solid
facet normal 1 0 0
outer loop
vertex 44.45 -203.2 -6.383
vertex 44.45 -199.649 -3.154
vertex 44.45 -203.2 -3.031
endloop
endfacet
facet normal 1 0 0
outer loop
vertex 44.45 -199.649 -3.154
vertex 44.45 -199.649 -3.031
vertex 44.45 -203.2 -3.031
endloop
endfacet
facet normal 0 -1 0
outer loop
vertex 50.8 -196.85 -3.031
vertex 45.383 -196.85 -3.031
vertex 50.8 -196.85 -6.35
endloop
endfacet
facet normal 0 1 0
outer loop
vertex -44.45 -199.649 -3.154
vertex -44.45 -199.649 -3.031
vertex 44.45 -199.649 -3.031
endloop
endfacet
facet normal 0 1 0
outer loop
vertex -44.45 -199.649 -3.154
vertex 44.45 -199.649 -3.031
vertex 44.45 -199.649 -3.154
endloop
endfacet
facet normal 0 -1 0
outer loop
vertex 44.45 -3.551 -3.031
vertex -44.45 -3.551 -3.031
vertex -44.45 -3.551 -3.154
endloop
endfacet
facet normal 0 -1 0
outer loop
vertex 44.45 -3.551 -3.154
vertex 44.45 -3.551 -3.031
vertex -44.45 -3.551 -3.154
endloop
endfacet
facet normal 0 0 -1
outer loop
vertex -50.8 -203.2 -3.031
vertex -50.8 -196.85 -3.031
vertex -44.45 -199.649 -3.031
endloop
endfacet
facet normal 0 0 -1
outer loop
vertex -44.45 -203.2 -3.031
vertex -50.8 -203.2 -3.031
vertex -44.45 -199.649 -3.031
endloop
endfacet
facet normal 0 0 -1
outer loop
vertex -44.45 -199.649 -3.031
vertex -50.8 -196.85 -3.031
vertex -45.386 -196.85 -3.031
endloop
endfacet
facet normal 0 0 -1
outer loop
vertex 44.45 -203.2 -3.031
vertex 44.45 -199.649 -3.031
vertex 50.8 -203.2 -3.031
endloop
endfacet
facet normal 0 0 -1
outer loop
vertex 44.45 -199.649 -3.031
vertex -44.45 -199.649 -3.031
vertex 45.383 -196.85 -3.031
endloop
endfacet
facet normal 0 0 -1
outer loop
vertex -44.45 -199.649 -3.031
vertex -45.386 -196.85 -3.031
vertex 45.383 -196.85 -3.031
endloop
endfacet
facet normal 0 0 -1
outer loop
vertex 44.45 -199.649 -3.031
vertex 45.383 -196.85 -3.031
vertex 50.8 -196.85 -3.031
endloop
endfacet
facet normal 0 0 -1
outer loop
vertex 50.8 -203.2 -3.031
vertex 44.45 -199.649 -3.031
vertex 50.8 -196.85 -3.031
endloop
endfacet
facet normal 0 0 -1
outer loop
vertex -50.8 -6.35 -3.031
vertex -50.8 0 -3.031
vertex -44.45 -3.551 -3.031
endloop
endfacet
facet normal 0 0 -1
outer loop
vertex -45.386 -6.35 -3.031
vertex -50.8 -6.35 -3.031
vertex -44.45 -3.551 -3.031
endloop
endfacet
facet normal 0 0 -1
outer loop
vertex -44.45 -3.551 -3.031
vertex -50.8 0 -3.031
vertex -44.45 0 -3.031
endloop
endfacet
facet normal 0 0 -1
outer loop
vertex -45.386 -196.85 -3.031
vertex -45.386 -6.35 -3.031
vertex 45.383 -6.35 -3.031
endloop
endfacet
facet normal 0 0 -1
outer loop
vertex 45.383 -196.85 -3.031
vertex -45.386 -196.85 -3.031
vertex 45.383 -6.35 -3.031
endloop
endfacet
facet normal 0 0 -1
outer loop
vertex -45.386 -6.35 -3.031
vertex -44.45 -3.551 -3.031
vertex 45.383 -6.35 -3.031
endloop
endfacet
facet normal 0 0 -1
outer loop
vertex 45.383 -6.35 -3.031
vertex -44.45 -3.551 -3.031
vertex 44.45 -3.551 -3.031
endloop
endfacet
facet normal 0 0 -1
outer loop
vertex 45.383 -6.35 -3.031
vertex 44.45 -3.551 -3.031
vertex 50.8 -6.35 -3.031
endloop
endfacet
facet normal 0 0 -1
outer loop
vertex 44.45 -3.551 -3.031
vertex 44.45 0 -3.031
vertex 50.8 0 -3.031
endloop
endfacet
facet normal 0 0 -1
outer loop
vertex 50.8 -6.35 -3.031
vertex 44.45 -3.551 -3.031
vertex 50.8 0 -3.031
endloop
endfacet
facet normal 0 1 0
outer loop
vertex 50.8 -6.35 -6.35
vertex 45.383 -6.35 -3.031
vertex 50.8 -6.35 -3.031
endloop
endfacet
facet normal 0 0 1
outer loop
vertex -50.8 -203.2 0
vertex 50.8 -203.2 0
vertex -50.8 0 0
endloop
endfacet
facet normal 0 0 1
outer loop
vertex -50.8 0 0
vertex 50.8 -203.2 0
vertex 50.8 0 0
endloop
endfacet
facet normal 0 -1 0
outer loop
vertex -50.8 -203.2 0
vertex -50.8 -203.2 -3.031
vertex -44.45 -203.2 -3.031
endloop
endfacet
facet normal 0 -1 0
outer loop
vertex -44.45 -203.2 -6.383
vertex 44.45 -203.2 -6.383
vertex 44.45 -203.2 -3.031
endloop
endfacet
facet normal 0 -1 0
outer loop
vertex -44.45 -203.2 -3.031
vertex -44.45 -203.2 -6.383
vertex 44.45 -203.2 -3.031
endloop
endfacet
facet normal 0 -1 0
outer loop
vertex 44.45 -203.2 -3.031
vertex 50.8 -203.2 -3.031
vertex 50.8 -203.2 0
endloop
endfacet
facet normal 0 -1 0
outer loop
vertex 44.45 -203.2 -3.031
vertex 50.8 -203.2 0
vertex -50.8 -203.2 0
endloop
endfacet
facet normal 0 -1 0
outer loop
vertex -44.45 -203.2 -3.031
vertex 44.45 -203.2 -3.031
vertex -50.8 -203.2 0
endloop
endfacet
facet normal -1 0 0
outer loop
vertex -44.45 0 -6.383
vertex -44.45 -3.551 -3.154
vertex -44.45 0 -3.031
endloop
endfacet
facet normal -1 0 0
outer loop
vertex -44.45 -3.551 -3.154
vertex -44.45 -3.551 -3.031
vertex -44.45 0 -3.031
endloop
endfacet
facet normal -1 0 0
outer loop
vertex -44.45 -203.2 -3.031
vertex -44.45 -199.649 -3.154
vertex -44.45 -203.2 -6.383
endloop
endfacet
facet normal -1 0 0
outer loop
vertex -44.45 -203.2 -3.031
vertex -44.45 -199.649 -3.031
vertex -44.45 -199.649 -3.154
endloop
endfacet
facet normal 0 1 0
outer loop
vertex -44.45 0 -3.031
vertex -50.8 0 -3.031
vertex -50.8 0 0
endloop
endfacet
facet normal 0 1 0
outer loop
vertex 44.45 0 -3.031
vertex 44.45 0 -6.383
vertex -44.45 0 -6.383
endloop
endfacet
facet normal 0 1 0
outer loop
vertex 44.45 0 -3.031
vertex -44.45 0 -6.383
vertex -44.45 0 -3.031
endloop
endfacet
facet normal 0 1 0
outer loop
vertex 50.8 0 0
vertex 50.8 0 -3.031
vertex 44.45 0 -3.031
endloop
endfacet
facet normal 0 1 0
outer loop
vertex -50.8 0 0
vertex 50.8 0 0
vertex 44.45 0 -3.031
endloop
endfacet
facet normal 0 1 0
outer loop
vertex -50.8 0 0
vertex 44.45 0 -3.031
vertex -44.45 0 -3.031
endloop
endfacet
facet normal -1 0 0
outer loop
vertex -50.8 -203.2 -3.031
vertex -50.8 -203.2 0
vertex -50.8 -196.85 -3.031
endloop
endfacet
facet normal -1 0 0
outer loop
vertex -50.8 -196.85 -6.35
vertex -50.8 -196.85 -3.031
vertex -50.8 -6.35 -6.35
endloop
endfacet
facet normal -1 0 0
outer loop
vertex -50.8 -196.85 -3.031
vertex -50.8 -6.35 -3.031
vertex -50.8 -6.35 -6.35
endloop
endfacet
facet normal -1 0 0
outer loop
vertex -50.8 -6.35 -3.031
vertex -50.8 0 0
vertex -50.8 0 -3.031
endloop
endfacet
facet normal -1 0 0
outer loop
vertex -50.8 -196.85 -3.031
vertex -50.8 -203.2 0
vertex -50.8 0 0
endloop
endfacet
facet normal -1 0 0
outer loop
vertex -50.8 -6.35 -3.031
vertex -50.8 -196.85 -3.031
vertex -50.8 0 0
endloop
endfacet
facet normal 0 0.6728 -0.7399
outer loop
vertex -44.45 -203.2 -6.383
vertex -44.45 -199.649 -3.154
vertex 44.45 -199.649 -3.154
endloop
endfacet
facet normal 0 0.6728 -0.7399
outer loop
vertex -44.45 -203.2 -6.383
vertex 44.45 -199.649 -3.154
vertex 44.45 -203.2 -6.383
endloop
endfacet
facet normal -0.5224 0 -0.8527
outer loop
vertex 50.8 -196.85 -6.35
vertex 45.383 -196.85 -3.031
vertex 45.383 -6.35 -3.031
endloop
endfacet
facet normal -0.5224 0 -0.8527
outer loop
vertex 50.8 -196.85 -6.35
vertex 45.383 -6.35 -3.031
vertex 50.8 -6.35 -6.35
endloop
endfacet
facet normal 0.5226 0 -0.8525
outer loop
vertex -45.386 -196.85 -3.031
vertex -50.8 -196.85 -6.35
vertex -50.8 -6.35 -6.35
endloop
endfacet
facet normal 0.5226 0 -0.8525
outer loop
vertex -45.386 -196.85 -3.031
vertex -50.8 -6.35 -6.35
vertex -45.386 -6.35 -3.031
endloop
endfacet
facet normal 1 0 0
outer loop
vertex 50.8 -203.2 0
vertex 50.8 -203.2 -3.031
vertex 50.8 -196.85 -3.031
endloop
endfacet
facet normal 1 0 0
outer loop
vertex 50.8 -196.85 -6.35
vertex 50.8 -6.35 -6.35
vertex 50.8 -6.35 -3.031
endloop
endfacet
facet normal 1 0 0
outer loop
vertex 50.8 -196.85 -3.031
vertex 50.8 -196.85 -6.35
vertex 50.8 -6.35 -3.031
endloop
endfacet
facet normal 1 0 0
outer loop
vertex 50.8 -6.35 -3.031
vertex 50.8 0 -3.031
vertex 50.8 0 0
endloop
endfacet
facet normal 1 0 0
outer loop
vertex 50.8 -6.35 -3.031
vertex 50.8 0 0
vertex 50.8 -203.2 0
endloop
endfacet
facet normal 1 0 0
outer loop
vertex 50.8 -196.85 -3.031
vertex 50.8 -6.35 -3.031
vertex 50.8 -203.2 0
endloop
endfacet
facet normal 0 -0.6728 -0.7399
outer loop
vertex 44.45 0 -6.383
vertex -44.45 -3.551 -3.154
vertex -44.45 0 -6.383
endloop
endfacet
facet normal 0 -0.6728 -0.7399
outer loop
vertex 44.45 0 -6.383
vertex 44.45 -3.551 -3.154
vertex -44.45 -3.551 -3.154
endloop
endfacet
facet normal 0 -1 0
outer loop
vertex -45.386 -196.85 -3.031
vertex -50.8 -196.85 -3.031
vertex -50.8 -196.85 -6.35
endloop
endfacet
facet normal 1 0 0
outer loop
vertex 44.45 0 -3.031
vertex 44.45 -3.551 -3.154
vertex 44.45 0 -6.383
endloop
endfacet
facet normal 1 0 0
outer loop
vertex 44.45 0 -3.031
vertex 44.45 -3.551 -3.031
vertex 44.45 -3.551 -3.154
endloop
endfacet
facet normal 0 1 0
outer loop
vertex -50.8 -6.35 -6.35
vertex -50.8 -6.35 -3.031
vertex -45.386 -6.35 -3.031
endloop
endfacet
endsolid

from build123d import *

# Parameters (mm, degrees)
F1_DEPTH = 203.2
F3_DEPTH = 44.45
F5_DEPTH = 6.35
F7_DEPTH = 6.35


# Not quite as in the source:
# - a pattern or mirror of a feature is missing from the dataset's text; its kind, count and spacing are read off the source's solid


with BuildPart() as f1:
    # F0 (on Front) → F1 (new body)
    with BuildSketch(Plane.XZ):
        Polygon((50.8, 0), (0, 0), (-50.8, 0), (-50.8, -6.35), (-45.386130618, -3.0314885393), (45.382719487, -3.0314885393), (50.8, -6.35), align=None)
    extrude(amount=F1_DEPTH)

    # F2 (on Right) → F3 (join, symmetric)
    with BuildSketch(Plane.YZ):
        Polygon((0, -6.3831382431), (0, 0), (-3.5511243623, 0), (-3.5511243623, -3.1539145857), align=None)
    f3 = extrude(amount=F3_DEPTH, both=True)

    # F3_copies: F3 across plane
    add(f3.mirror(Plane(origin=(0, -101.6, 0), x_dir=(0, 0, -1), z_dir=(0, -1, 0))))

    # F4 (on Front) → F5 (cut)
    with BuildSketch(Plane.XZ):
        Polygon((50.8, -3.0314885393), (45.382719487, -3.0314885393), (50.8, -6.35), align=None)
        Polygon((-50.8, -3.0314885393), (-50.8, -6.35), (-45.382719487, -3.0314885393), align=None)
    extrude(amount=F5_DEPTH, mode=Mode.SUBTRACT)

    # F6 (on face) → F7 (cut)
    with BuildSketch(Plane.XZ.offset(203.2)):
        Polygon((-50.8, -6.35), (-45.386130618, -3.0314885393), (-50.8, -3.0314885393), align=None)
        Polygon((50.8, -6.35), (50.8, -3.0314885393), (45.382719487, -3.0314885393), align=None)
    extrude(amount=-F7_DEPTH, mode=Mode.SUBTRACT)


solid = f1.part
